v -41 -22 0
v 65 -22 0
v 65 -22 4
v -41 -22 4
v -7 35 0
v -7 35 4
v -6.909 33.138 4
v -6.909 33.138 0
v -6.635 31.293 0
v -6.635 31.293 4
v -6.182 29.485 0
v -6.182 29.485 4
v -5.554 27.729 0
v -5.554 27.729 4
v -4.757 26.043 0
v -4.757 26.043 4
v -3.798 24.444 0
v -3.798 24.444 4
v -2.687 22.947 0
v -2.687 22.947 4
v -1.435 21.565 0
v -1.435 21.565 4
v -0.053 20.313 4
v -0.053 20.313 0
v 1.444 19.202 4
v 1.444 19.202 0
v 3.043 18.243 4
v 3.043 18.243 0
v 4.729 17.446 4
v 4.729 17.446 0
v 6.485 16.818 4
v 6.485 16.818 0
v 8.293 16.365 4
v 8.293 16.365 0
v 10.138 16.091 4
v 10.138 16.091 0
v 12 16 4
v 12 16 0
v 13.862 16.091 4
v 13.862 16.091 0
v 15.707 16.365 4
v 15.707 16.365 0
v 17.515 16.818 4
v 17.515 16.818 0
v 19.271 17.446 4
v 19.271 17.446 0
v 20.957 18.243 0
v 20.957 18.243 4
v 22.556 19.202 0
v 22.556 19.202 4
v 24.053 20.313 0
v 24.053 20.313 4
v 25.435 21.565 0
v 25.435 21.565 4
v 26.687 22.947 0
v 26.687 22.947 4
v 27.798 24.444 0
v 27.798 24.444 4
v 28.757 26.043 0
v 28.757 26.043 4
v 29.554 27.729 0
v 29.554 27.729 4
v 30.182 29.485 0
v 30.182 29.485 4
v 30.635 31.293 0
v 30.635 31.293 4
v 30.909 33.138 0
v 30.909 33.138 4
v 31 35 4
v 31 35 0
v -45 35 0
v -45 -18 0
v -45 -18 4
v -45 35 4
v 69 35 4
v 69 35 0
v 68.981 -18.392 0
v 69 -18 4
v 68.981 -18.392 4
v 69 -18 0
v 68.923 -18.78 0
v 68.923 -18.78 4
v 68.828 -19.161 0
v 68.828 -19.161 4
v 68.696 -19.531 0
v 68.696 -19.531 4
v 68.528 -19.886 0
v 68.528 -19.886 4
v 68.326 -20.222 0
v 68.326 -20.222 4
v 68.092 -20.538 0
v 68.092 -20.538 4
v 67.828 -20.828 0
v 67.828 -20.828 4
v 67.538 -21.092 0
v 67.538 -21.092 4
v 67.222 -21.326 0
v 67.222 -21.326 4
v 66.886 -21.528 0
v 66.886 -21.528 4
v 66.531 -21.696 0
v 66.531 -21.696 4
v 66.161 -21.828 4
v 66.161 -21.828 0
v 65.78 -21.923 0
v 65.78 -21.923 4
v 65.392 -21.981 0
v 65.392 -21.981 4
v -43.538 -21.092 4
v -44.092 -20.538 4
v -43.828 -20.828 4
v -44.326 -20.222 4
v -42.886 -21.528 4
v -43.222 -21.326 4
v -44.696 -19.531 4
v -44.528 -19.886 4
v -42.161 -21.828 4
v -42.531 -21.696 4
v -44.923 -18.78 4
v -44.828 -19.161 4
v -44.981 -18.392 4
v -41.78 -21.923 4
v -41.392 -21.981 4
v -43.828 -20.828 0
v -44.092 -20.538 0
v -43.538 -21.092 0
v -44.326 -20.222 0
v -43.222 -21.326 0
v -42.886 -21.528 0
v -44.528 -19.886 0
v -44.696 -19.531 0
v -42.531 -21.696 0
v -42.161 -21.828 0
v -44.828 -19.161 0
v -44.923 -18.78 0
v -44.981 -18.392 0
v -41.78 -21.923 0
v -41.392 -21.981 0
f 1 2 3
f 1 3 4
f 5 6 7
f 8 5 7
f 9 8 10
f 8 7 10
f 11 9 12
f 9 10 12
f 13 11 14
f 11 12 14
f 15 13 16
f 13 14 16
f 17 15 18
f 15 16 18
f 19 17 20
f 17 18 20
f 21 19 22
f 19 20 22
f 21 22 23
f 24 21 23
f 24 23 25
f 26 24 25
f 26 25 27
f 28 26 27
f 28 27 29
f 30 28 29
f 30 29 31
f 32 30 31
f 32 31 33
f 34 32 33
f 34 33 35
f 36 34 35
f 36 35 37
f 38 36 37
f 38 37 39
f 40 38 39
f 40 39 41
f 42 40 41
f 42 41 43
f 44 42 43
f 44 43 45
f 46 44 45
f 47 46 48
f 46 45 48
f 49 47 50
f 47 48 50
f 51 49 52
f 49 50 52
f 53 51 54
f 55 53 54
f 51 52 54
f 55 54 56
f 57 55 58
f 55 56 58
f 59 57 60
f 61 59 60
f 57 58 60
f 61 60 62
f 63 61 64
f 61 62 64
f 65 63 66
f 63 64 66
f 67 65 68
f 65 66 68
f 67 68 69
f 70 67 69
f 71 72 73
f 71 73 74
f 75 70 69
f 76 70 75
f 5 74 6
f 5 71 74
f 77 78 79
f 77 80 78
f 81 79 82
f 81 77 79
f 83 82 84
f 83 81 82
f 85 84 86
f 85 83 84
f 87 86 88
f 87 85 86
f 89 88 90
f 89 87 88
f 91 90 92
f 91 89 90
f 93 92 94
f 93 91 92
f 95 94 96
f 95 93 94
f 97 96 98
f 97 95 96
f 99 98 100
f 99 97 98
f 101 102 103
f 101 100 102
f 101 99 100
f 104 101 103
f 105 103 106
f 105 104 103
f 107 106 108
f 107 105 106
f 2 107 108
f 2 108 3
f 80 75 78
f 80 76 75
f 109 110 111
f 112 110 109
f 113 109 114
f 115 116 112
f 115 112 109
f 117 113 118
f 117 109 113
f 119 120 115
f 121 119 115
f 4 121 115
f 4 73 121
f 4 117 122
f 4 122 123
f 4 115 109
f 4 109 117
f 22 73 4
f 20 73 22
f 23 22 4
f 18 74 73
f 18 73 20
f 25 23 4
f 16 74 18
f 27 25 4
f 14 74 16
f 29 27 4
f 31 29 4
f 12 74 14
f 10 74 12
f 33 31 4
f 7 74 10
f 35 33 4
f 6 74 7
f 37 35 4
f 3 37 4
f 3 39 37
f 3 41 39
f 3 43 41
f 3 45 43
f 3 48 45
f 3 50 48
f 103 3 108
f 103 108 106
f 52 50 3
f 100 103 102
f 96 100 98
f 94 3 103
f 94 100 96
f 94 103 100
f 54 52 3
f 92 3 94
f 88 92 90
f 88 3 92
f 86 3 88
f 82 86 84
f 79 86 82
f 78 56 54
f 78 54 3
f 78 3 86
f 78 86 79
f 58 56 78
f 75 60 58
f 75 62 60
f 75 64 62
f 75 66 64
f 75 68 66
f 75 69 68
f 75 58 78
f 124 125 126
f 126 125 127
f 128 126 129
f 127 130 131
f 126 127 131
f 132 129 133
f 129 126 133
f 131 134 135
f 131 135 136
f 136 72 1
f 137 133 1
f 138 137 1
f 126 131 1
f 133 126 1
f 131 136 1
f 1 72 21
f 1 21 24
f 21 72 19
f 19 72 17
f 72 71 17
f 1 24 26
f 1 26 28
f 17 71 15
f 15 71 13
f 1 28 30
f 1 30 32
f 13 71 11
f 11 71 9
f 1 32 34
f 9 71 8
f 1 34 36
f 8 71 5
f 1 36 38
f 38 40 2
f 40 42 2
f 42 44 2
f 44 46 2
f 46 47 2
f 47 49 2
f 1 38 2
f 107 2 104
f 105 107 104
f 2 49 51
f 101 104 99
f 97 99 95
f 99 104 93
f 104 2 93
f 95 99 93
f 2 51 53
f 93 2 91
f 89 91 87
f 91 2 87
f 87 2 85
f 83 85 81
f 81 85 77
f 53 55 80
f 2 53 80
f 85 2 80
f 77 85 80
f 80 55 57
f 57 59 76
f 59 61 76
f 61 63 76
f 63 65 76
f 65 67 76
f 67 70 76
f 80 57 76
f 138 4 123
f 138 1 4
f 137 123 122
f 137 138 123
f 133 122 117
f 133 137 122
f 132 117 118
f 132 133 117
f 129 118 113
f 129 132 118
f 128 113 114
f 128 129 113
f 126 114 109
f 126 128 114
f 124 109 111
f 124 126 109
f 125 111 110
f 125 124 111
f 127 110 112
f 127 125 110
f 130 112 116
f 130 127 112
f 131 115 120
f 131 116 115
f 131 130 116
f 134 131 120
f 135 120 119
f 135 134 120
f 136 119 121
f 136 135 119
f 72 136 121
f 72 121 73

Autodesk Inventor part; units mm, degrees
ref_plane "YZ Plane" through (0, 0, 0) normal (1, 0, 0) x (0, 1, 0)
ref_plane "XZ Plane" through (0, 0, 0) normal (0, 1, 0) x (-1, 0, 0)
ref_plane "XY Plane" through (0, 0, 0) normal (0, 0, 1) x (1, 0, 0)
sketch "Sketch1" plane through (0, 0, 0) normal (0, 0, 1) x (1, 0, 0)
  line L0 (-45, 35) -> (69, 35)
  line L1 (69, 35) -> (69, -18)
  line L2 (65, -22) -> (-41, -22)
  line L3 (-45, -18) -> (-45, 35)
  arc A0 (-45, -18) -> (-41, -22) centre (-41, -18) ccw
  arc A1 (65, -22) -> (69, -18) centre (65, -18) ccw
  point P0 (0, 0)
  dimension "d0" = 114
  dimension "d1" = 4
  dimension "d2" = 4
  dimension "d3" = 57
extrude "Plate1" add sketch "Sketch1" along normal blind 4
sketch "Sketch2" plane through (0, 0, 4) normal (0, 0, 1) x (1, 0, 0)
  line L0 (69, 35) -> (-45, 35) projected
  arc A0 (-7, 35) -> (31, 35) centre (12, 35) ccw
  point P0 (0, 0)
  dimension "d5" = 38
extrude "Extrusion1" cut sketch "Sketch2" against normal through all
equation "\"d4\" = Thickness"
equation "\"BendRadius\" = Thickness"
equation "\"BendReliefWidth\" = Thickness"
equation "\"BendReliefDepth\" = 0.5 * Thickness"
equation "\"CornerReliefSize\" = 4 * Thickness"
equation "\"MinimumRemnant\" = 2 * Thickness"
equation "\"TransitionRadius\" = BendRadius"
equation "\"JacobiRadiusSize\" = BendRadius"
equation "\"GapSize\" = Thickness"
equation "\"Thickness\" = 4"
properties part number "Bottom joint housing cover_ final"
